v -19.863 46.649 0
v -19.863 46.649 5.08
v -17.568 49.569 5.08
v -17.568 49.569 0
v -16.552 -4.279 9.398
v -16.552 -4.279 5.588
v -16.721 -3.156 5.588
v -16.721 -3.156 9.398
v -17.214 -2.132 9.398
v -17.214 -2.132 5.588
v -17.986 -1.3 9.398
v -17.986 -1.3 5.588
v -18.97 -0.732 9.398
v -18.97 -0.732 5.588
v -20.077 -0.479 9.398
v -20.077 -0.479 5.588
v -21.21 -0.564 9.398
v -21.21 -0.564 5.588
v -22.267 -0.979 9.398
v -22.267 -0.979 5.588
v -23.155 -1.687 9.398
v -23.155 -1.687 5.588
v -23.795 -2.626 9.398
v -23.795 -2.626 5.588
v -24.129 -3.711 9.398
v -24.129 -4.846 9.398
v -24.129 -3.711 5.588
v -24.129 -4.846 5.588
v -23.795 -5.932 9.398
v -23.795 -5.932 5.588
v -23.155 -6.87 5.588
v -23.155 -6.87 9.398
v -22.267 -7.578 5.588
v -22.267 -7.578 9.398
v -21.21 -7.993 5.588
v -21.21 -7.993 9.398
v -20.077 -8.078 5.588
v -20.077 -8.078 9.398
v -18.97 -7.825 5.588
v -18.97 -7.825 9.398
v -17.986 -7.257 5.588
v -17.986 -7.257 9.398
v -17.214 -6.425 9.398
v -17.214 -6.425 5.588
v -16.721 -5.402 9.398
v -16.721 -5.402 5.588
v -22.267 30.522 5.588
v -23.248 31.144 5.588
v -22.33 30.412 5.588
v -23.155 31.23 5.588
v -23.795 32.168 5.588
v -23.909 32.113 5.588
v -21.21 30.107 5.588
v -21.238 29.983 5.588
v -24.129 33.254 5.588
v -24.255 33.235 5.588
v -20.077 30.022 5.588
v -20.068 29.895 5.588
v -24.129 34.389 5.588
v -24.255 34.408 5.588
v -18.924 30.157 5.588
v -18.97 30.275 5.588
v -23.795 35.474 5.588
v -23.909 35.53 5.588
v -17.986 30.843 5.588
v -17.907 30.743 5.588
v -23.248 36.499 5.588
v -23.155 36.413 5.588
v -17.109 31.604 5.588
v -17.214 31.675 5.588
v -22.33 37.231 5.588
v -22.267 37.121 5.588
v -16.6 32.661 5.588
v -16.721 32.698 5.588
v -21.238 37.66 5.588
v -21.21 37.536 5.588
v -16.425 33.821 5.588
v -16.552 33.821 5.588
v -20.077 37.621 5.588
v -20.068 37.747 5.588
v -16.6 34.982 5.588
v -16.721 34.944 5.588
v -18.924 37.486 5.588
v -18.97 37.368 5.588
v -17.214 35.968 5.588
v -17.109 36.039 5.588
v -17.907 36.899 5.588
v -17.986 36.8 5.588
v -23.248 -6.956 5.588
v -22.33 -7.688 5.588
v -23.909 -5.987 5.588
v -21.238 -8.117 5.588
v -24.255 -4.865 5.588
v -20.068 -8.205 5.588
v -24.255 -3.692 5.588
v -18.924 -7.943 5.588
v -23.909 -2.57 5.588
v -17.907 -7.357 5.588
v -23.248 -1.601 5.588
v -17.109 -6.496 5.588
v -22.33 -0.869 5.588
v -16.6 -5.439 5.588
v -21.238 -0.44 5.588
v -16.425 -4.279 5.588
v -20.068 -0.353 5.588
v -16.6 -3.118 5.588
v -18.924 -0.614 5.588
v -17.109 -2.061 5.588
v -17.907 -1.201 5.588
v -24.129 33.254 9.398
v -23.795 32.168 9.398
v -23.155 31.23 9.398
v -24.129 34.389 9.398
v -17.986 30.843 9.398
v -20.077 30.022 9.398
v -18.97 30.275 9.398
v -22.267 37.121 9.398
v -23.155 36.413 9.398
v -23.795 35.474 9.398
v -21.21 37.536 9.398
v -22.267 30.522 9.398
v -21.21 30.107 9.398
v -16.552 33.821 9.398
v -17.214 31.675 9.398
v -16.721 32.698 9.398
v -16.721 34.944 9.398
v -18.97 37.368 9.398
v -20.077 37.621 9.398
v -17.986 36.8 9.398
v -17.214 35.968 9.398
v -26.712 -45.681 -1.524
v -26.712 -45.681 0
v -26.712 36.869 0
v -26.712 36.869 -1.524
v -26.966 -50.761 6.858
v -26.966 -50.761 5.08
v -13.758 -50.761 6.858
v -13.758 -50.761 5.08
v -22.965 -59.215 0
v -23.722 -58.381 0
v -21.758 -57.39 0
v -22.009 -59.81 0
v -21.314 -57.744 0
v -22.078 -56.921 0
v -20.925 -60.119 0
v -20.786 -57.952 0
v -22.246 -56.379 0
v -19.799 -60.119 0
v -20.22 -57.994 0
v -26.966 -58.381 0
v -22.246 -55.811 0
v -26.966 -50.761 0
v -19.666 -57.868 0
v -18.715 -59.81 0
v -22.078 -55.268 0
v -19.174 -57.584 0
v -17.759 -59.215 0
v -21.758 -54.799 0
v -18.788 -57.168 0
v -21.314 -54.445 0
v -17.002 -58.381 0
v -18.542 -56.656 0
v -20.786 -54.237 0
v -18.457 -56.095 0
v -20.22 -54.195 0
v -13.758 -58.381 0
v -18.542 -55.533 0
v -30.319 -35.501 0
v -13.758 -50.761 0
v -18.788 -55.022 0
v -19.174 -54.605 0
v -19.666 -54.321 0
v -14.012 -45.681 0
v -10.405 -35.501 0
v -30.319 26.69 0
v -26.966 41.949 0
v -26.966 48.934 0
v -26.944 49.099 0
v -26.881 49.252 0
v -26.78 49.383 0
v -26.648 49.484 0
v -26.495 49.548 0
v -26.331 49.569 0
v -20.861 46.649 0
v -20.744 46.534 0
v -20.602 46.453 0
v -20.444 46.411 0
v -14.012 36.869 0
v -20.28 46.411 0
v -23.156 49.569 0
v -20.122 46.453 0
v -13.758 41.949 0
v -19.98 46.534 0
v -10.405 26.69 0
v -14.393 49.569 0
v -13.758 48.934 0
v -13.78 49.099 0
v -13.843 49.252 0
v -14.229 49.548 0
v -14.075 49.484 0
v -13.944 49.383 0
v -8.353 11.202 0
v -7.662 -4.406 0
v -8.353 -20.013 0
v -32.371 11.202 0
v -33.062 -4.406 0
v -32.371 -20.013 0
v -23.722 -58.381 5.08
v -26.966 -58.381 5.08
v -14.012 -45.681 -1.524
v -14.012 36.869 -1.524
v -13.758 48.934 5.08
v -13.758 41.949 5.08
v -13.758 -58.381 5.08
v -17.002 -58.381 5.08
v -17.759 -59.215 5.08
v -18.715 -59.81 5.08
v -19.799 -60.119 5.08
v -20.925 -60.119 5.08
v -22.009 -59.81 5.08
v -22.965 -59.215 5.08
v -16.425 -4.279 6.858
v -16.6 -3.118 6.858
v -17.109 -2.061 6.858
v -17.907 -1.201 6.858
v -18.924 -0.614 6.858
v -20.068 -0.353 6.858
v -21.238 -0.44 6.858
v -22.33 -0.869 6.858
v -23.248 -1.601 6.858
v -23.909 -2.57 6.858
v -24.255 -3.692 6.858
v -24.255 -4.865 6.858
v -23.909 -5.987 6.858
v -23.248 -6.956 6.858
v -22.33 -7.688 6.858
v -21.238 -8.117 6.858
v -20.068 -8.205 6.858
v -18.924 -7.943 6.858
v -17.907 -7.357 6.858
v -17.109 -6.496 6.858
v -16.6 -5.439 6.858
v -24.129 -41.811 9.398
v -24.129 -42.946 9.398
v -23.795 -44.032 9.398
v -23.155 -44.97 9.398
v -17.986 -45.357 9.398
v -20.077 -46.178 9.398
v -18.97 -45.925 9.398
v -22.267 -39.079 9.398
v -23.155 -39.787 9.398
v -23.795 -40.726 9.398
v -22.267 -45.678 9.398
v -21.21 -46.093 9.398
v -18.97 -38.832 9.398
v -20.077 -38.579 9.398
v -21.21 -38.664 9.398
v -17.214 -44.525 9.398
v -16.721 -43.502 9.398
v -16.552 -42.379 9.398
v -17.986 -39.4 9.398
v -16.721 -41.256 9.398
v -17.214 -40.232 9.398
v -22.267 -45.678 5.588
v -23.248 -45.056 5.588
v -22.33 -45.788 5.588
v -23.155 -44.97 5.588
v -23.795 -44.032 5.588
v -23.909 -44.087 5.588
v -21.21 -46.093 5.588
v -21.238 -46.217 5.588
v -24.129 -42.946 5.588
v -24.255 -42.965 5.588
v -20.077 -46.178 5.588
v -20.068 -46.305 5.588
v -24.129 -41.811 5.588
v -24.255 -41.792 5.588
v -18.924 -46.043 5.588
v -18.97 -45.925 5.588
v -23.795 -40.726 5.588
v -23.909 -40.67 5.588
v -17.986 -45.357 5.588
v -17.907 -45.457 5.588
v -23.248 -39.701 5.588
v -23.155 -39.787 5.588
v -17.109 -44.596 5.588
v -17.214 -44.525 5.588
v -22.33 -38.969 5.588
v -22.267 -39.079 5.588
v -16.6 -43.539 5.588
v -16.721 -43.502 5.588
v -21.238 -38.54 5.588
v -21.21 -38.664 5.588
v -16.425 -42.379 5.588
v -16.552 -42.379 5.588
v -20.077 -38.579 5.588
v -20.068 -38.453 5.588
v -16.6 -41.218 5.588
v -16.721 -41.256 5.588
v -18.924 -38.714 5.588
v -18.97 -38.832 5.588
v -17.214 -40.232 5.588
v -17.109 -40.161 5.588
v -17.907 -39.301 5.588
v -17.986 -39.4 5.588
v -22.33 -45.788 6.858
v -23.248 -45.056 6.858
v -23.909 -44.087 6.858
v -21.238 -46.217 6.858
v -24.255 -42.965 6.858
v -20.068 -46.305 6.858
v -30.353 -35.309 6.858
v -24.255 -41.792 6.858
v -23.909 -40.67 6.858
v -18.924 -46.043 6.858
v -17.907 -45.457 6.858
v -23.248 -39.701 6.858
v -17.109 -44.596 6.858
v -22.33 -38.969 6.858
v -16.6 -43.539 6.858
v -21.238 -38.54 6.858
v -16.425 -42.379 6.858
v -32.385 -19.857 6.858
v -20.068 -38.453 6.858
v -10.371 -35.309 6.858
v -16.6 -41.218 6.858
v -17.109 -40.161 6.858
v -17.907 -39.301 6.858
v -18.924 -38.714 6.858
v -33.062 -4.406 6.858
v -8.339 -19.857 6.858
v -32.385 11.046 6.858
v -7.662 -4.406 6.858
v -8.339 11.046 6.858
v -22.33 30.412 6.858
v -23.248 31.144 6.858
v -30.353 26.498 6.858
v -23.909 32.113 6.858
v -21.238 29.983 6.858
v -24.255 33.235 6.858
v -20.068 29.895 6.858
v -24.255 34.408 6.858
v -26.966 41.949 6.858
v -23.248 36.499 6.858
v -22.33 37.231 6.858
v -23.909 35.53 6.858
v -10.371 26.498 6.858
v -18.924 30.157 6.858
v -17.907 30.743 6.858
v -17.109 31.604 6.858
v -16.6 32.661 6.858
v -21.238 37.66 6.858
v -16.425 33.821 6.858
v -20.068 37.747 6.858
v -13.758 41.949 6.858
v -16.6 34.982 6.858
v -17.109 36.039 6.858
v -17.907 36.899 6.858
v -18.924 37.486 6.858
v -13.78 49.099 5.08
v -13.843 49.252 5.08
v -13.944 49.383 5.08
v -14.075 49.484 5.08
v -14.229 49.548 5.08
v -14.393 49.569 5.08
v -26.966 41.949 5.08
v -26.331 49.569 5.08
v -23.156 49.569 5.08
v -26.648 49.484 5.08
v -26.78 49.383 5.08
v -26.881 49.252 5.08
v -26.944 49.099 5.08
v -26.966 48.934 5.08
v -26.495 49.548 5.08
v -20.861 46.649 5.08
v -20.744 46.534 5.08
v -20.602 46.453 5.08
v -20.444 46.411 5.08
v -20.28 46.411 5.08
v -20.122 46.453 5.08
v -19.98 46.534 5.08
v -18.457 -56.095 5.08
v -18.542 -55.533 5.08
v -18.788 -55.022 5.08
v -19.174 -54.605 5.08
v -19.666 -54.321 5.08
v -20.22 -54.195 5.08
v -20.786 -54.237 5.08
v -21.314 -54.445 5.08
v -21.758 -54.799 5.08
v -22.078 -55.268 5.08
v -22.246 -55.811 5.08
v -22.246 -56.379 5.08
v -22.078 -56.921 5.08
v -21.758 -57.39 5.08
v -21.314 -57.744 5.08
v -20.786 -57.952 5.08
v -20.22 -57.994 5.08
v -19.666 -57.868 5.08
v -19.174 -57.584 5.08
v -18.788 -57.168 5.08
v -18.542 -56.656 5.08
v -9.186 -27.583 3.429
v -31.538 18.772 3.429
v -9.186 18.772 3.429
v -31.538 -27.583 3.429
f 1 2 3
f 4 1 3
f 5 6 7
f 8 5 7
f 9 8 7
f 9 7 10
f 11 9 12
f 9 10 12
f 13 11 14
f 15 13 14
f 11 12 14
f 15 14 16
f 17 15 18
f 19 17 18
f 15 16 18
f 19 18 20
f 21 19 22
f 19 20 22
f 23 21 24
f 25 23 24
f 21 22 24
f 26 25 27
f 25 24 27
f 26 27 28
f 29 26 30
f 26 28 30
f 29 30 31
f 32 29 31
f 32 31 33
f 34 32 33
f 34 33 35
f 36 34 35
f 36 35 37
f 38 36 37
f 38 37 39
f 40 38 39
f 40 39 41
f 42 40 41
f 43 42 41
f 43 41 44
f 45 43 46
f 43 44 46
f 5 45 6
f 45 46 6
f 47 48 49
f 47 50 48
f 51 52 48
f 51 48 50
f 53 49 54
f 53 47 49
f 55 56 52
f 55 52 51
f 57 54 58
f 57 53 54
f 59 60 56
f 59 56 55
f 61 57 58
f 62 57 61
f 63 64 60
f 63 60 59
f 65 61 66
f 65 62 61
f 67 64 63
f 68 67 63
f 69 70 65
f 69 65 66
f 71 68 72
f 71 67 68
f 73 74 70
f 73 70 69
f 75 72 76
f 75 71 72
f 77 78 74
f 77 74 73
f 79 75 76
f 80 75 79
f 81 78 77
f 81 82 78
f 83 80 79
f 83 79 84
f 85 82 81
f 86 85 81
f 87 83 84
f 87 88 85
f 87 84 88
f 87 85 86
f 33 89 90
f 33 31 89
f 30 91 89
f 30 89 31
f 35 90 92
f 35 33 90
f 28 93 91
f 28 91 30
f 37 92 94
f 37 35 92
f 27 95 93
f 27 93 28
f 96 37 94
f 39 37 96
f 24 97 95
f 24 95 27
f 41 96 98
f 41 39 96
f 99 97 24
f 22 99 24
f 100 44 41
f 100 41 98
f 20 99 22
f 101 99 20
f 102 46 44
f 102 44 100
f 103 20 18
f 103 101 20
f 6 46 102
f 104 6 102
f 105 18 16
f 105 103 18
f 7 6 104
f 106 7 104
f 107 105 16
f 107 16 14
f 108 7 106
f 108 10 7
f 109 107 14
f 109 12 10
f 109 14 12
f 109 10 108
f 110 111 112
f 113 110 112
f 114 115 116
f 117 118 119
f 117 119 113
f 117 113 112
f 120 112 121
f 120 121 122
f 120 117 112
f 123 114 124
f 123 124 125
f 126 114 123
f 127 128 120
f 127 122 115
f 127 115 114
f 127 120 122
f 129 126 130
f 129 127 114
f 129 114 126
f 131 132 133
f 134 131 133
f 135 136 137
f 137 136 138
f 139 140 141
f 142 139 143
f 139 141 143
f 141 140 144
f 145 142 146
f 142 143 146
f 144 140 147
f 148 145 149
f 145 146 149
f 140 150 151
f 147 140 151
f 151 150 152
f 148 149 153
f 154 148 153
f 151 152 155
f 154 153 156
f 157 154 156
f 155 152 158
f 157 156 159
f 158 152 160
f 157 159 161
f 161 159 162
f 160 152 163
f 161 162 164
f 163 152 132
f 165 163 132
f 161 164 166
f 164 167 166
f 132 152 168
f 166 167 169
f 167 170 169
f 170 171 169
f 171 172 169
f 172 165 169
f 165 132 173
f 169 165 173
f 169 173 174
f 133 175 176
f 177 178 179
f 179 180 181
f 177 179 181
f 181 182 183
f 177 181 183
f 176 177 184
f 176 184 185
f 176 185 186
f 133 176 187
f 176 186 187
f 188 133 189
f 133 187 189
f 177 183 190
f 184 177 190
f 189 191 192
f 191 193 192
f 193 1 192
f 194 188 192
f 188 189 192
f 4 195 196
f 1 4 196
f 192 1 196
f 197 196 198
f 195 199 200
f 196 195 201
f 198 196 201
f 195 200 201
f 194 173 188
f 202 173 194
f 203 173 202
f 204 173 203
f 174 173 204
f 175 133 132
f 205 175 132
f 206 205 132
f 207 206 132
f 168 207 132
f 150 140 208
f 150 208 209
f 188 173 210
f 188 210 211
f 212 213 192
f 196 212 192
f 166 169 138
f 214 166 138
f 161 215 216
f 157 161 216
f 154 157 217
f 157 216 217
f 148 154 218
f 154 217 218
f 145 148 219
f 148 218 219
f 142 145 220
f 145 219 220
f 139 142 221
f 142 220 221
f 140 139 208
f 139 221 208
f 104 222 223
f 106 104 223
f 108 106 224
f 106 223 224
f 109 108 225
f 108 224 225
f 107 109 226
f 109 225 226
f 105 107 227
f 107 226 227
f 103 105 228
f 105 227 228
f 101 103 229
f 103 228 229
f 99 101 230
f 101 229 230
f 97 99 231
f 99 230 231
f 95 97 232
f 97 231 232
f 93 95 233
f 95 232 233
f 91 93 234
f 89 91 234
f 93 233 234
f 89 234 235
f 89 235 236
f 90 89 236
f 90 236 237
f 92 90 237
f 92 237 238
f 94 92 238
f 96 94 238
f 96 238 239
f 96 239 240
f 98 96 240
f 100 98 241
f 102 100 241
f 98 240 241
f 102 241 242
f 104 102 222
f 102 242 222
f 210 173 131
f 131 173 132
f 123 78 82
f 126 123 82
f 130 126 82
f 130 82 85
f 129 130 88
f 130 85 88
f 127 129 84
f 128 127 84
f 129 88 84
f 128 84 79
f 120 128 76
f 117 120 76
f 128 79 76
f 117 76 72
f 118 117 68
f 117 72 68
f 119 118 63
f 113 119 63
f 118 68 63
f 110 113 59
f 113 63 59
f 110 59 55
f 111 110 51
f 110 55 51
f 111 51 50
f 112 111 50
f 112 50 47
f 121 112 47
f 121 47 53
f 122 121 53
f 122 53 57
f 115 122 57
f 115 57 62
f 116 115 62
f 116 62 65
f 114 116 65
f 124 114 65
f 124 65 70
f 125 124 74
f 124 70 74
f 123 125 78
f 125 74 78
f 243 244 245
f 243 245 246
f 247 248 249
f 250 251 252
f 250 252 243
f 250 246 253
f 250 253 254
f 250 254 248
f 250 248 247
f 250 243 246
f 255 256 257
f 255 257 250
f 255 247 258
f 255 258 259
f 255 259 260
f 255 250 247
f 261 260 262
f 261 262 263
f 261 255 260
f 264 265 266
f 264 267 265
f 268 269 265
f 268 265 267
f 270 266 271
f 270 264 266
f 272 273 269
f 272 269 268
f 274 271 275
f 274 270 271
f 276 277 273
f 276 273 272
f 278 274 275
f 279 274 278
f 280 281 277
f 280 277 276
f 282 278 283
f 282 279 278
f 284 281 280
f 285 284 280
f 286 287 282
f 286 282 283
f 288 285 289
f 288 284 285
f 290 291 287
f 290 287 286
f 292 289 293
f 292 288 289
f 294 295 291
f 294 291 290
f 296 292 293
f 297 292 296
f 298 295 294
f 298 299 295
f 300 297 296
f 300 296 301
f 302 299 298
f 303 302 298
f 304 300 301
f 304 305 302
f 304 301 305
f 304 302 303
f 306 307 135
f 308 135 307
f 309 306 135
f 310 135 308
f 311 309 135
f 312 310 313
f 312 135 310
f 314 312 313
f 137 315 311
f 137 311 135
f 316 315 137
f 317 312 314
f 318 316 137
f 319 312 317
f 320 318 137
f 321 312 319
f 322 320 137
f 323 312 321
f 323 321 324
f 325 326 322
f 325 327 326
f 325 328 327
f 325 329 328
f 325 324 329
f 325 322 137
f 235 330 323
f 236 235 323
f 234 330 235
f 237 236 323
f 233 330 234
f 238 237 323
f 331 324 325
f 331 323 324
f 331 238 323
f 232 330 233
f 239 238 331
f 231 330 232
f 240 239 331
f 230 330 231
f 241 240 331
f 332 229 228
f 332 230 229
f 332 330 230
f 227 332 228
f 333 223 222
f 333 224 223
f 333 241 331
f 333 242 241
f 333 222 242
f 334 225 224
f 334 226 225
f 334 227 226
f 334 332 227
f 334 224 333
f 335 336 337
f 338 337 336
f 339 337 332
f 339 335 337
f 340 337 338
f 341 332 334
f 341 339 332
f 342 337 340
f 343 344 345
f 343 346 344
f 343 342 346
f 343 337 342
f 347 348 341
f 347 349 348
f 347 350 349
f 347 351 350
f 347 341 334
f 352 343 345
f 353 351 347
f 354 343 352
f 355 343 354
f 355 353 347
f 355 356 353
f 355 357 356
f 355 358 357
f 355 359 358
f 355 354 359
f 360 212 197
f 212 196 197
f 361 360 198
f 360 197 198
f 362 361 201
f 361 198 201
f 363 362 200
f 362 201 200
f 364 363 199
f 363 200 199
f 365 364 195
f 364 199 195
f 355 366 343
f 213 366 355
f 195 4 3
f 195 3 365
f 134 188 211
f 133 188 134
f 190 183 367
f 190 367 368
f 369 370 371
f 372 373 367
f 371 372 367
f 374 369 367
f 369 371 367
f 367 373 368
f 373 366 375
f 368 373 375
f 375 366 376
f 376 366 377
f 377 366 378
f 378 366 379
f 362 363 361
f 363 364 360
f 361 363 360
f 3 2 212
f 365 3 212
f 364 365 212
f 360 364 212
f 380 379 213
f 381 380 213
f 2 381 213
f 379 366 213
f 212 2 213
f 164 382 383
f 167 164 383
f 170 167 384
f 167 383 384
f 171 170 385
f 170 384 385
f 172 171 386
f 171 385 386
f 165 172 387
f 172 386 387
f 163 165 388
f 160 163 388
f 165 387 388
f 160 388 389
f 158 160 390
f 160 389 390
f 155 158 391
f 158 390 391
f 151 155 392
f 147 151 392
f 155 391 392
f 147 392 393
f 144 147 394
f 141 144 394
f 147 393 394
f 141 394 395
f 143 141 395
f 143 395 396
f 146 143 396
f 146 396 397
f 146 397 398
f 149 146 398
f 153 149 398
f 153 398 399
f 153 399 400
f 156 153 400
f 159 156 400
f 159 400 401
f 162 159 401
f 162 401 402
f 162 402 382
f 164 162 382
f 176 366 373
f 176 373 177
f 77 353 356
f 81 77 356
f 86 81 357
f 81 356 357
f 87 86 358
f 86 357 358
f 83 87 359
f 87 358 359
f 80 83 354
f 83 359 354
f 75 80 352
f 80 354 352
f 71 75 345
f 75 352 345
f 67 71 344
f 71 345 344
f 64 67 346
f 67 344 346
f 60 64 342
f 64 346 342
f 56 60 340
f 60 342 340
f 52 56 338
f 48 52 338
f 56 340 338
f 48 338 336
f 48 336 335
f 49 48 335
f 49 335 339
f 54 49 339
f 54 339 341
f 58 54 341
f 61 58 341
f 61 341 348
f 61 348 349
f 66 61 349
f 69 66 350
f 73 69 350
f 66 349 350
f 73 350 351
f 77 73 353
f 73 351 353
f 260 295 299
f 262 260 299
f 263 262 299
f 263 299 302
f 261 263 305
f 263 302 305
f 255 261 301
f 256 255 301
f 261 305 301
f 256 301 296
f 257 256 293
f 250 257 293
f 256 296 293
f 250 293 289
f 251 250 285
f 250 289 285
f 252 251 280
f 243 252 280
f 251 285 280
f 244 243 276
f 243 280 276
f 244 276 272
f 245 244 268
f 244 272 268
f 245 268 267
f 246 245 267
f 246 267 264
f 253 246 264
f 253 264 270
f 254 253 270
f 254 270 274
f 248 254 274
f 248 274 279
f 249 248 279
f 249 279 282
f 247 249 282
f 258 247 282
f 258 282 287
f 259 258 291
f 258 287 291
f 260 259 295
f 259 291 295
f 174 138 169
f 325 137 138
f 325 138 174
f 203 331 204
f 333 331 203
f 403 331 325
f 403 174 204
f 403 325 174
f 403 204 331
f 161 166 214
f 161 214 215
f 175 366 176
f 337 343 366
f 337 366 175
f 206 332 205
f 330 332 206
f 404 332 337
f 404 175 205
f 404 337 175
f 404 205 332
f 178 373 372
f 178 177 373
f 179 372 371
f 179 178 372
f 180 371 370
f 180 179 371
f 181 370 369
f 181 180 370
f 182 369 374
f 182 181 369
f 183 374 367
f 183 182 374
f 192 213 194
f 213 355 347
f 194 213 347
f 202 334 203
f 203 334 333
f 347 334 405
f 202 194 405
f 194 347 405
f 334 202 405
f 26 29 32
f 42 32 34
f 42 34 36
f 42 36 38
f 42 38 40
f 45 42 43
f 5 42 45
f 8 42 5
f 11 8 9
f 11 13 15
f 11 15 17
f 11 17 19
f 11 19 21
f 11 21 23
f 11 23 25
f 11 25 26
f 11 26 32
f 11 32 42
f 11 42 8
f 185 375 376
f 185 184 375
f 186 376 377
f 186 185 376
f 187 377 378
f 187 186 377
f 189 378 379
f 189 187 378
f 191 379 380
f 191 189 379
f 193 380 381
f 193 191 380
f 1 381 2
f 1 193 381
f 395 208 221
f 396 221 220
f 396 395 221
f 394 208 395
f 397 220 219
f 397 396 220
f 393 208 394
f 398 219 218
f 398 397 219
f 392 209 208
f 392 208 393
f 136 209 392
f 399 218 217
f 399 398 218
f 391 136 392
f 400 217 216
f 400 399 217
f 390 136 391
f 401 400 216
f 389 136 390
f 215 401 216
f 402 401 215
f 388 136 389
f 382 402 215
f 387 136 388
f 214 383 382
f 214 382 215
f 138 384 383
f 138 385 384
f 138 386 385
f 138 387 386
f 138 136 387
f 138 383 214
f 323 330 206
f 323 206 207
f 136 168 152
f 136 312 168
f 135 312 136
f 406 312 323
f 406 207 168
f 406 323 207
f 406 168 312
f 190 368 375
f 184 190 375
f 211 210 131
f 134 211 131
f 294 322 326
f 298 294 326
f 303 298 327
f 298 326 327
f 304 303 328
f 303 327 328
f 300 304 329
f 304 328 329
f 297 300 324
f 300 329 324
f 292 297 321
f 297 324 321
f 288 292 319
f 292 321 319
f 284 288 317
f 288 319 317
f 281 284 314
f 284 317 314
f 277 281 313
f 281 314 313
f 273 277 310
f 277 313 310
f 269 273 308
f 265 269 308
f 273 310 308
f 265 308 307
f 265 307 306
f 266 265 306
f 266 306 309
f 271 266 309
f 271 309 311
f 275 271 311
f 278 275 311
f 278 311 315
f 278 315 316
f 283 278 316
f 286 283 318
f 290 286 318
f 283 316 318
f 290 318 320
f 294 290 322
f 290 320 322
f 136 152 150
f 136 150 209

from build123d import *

# Parameters (mm, degrees)
SKETCH1_W           = 25.4
SKETCH1_H           = 92.71
BOSS_EXTRUDE1_DEPTH = 5.08
SKETCH3_W           = 13.208
SKETCH3_H           = 5.08
BOSS_EXTRUDE3_DEPTH = 11.938
SKETCH5_R           = 1.905
CUT_EXTRUDE2_DEPTH  = 6.08
SKETCH7_W           = 25.4
SKETCH7_H           = 92.71
BOSS_EXTRUDE4_DEPTH = 1.778
SKETCH8_R           = 3.937
CUT_EXTRUDE3_DEPTH  = 1.27
SKETCH10_R          = 3.81
BOSS_EXTRUDE5_DEPTH = 3.81
SKETCH11_W          = 13.208
SKETCH11_H          = 5.08
BOSS_EXTRUDE6_DEPTH = 7.62
CUT_EXTRUDE4_DEPTH  = 6.08
FILLET1_R           = 0.635
CUT_EXTRUDE7_DEPTH  = 7.62
CUT_EXTRUDE8_DEPTH  = 7.8580001
SKETCH17_W          = 12.7
SKETCH17_H          = 82.55
BOSS_EXTRUDE7_DEPTH = 1.524


with BuildPart() as part:
    # Sketch1 → Boss-Extrude1 (new body)
    with BuildSketch(Plane.XY):
        with Locations((-20.361983471, -4.405640496)):
            Rectangle(SKETCH1_W, SKETCH1_H)
    extrude(amount=BOSS_EXTRUDE1_DEPTH)

    # Sketch3 → Boss-Extrude3 (add)
    with BuildSketch(Plane.XZ.offset(50.760640496)):
        with Locations((-20.361983471, 2.54)):
            Rectangle(SKETCH3_W, SKETCH3_H)
    extrude(amount=BOSS_EXTRUDE3_DEPTH)

    # Sketch5 → Cut-Extrude2 (cut, through all)
    with BuildSketch(Plane.XY.offset(5.08)):
        with Locations((-20.361983471, -56.094640496)):
            Circle(SKETCH5_R)
        with BuildLine():
            Line((-23.722087636, -58.380640496), (-26.965983471, -58.380640496))
            Line((-26.965983471, -58.380640496), (-26.965983471, -62.698640496))
            Line((-26.965983471, -62.698640496), (-13.757983471, -62.698640496))
            Line((-13.757983471, -62.698640496), (-13.757983471, -58.380640496))
            Line((-13.757983471, -58.380640496), (-17.001879306, -58.380640496))
            ThreePointArc((-17.001879306, -58.380640496), (-20.361983471, -60.158640496), (-23.722087636, -58.380640496))
        make_face()
    extrude(amount=-CUT_EXTRUDE2_DEPTH, mode=Mode.SUBTRACT)

    # Sketch7 → Boss-Extrude4 (add)
    with BuildSketch(Plane.XY.offset(5.08)):
        with Locations((-20.361983471, -4.405640496)):
            Rectangle(SKETCH7_W, SKETCH7_H)
    extrude(amount=BOSS_EXTRUDE4_DEPTH)

    # Sketch8 → Cut-Extrude3 (cut)
    with BuildSketch(Plane.XY.offset(6.858)):
        with Locations((-20.361983471, -42.378640496)):
            Circle(SKETCH8_R)
        with Locations((-20.361983471, -4.278640496)):
            Circle(SKETCH8_R)
        with Locations((-20.361983471, 33.821359504)):
            Circle(SKETCH8_R)
    extrude(amount=-CUT_EXTRUDE3_DEPTH, mode=Mode.SUBTRACT)

    # Sketch10 → Boss-Extrude5 (add)
    with BuildSketch(Plane.XY.offset(5.588)):
        with Locations((-20.361983471, -42.378640496)):
            Circle(SKETCH10_R)
        with Locations((-20.361983471, -4.278640496)):
            Circle(SKETCH10_R)
        with Locations((-20.361983471, 33.821359504)):
            Circle(SKETCH10_R)
    extrude(amount=BOSS_EXTRUDE5_DEPTH)

    # Sketch11 → Boss-Extrude6 (add)
    with BuildSketch(Plane(origin=(0, 41.949359504, 0), x_dir=(1, 0, 0), z_dir=(0, 1, 0))):
        with Locations((-20.361983471, -2.54)):
            Rectangle(SKETCH11_W, SKETCH11_H)
    extrude(amount=BOSS_EXTRUDE6_DEPTH)

    # Sketch12 → Cut-Extrude4 (cut, through all)
    with BuildSketch(Plane.XY.offset(5.08)):
        Polygon((-23.155983471, 49.569359504), (-20.361983471, 46.013359504), (-17.567983471, 49.569359504), align=None)
    extrude(amount=-CUT_EXTRUDE4_DEPTH, mode=Mode.SUBTRACT)

    # Fillet1
    fillet1_edges = [part.edges().sort_by_distance(p)[0] for p in [
        (-20.361983471, 46.013359504, 2.54),
        (-26.965983471, 49.569359504, 2.54),
        (-13.757983471, 49.569359504, 2.54),
    ]]
    fillet(fillet1_edges, radius=FILLET1_R)

    # Sketch14 → Cut-Extrude7 (cut)
    with BuildSketch(Plane.XY.offset(6.858)):
        with BuildLine():
            Line((-13.757983471, 41.949359504), (-7.661983471, 41.949359504))
            Line((-7.661983471, 41.949359504), (-7.661983471, -4.405640496))
            add(Edge.make_bspline(
                [(-13.757983471, 41.949359504), (-7.661983471, 18.771859504), (-7.661983471, -4.405640496)],
                knots=[0, 0, 0, 0.5, 0.5, 0.5], degree=2))
        make_face()
        with BuildLine():
            Line((-33.061983471, -4.405640496), (-33.061983471, 41.949359504))
            Line((-33.061983471, 41.949359504), (-26.965983471, 41.949359504))
            add(Edge.make_bspline(
                [(-26.965983471, 41.949359504), (-33.061983471, 18.771859504), (-33.061983471, -4.405640496)],
                knots=[0, 0, 0, 0.5, 0.5, 0.5], degree=2))
        make_face()
    extrude(amount=-CUT_EXTRUDE7_DEPTH, mode=Mode.SUBTRACT)

    # Sketch16 → Cut-Extrude8 (cut, through all)
    with BuildSketch(Plane.XY.offset(6.858)):
        with BuildLine():
            Line((-33.061983471, -4.405640496), (-33.061983471, -50.760640496))
            Line((-33.061983471, -50.760640496), (-26.965983471, -50.760640496))
            add(Edge.make_bspline(
                [(-33.061983471, -4.405640496), (-33.061983471, -27.583140496), (-26.965983471, -50.760640496)],
                knots=[0.5, 0.5, 0.5, 1, 1, 1], degree=2))
        make_face()
        with BuildLine():
            Line((-7.661983471, -4.405640496), (-7.661983471, -50.760640496))
            Line((-7.661983471, -50.760640496), (-13.757983471, -50.760640496))
            add(Edge.make_bspline(
                [(-13.757983471, -50.760640496), (-7.661983471, -27.583140496), (-7.661983471, -4.405640496)],
                knots=[0, 0, 0, 0.5, 0.5, 0.5], degree=2))
        make_face()
    extrude(amount=-CUT_EXTRUDE8_DEPTH, mode=Mode.SUBTRACT)

    # Sketch17 → Boss-Extrude7 (add)
    with BuildSketch(Plane(origin=(0, 0, 0), x_dir=(-1, 0, 0), z_dir=(0, 0, -1))):
        with Locations((20.361983471, -4.405640496)):
            Rectangle(SKETCH17_W, SKETCH17_H)
    extrude(amount=BOSS_EXTRUDE7_DEPTH)


solid = part.part
